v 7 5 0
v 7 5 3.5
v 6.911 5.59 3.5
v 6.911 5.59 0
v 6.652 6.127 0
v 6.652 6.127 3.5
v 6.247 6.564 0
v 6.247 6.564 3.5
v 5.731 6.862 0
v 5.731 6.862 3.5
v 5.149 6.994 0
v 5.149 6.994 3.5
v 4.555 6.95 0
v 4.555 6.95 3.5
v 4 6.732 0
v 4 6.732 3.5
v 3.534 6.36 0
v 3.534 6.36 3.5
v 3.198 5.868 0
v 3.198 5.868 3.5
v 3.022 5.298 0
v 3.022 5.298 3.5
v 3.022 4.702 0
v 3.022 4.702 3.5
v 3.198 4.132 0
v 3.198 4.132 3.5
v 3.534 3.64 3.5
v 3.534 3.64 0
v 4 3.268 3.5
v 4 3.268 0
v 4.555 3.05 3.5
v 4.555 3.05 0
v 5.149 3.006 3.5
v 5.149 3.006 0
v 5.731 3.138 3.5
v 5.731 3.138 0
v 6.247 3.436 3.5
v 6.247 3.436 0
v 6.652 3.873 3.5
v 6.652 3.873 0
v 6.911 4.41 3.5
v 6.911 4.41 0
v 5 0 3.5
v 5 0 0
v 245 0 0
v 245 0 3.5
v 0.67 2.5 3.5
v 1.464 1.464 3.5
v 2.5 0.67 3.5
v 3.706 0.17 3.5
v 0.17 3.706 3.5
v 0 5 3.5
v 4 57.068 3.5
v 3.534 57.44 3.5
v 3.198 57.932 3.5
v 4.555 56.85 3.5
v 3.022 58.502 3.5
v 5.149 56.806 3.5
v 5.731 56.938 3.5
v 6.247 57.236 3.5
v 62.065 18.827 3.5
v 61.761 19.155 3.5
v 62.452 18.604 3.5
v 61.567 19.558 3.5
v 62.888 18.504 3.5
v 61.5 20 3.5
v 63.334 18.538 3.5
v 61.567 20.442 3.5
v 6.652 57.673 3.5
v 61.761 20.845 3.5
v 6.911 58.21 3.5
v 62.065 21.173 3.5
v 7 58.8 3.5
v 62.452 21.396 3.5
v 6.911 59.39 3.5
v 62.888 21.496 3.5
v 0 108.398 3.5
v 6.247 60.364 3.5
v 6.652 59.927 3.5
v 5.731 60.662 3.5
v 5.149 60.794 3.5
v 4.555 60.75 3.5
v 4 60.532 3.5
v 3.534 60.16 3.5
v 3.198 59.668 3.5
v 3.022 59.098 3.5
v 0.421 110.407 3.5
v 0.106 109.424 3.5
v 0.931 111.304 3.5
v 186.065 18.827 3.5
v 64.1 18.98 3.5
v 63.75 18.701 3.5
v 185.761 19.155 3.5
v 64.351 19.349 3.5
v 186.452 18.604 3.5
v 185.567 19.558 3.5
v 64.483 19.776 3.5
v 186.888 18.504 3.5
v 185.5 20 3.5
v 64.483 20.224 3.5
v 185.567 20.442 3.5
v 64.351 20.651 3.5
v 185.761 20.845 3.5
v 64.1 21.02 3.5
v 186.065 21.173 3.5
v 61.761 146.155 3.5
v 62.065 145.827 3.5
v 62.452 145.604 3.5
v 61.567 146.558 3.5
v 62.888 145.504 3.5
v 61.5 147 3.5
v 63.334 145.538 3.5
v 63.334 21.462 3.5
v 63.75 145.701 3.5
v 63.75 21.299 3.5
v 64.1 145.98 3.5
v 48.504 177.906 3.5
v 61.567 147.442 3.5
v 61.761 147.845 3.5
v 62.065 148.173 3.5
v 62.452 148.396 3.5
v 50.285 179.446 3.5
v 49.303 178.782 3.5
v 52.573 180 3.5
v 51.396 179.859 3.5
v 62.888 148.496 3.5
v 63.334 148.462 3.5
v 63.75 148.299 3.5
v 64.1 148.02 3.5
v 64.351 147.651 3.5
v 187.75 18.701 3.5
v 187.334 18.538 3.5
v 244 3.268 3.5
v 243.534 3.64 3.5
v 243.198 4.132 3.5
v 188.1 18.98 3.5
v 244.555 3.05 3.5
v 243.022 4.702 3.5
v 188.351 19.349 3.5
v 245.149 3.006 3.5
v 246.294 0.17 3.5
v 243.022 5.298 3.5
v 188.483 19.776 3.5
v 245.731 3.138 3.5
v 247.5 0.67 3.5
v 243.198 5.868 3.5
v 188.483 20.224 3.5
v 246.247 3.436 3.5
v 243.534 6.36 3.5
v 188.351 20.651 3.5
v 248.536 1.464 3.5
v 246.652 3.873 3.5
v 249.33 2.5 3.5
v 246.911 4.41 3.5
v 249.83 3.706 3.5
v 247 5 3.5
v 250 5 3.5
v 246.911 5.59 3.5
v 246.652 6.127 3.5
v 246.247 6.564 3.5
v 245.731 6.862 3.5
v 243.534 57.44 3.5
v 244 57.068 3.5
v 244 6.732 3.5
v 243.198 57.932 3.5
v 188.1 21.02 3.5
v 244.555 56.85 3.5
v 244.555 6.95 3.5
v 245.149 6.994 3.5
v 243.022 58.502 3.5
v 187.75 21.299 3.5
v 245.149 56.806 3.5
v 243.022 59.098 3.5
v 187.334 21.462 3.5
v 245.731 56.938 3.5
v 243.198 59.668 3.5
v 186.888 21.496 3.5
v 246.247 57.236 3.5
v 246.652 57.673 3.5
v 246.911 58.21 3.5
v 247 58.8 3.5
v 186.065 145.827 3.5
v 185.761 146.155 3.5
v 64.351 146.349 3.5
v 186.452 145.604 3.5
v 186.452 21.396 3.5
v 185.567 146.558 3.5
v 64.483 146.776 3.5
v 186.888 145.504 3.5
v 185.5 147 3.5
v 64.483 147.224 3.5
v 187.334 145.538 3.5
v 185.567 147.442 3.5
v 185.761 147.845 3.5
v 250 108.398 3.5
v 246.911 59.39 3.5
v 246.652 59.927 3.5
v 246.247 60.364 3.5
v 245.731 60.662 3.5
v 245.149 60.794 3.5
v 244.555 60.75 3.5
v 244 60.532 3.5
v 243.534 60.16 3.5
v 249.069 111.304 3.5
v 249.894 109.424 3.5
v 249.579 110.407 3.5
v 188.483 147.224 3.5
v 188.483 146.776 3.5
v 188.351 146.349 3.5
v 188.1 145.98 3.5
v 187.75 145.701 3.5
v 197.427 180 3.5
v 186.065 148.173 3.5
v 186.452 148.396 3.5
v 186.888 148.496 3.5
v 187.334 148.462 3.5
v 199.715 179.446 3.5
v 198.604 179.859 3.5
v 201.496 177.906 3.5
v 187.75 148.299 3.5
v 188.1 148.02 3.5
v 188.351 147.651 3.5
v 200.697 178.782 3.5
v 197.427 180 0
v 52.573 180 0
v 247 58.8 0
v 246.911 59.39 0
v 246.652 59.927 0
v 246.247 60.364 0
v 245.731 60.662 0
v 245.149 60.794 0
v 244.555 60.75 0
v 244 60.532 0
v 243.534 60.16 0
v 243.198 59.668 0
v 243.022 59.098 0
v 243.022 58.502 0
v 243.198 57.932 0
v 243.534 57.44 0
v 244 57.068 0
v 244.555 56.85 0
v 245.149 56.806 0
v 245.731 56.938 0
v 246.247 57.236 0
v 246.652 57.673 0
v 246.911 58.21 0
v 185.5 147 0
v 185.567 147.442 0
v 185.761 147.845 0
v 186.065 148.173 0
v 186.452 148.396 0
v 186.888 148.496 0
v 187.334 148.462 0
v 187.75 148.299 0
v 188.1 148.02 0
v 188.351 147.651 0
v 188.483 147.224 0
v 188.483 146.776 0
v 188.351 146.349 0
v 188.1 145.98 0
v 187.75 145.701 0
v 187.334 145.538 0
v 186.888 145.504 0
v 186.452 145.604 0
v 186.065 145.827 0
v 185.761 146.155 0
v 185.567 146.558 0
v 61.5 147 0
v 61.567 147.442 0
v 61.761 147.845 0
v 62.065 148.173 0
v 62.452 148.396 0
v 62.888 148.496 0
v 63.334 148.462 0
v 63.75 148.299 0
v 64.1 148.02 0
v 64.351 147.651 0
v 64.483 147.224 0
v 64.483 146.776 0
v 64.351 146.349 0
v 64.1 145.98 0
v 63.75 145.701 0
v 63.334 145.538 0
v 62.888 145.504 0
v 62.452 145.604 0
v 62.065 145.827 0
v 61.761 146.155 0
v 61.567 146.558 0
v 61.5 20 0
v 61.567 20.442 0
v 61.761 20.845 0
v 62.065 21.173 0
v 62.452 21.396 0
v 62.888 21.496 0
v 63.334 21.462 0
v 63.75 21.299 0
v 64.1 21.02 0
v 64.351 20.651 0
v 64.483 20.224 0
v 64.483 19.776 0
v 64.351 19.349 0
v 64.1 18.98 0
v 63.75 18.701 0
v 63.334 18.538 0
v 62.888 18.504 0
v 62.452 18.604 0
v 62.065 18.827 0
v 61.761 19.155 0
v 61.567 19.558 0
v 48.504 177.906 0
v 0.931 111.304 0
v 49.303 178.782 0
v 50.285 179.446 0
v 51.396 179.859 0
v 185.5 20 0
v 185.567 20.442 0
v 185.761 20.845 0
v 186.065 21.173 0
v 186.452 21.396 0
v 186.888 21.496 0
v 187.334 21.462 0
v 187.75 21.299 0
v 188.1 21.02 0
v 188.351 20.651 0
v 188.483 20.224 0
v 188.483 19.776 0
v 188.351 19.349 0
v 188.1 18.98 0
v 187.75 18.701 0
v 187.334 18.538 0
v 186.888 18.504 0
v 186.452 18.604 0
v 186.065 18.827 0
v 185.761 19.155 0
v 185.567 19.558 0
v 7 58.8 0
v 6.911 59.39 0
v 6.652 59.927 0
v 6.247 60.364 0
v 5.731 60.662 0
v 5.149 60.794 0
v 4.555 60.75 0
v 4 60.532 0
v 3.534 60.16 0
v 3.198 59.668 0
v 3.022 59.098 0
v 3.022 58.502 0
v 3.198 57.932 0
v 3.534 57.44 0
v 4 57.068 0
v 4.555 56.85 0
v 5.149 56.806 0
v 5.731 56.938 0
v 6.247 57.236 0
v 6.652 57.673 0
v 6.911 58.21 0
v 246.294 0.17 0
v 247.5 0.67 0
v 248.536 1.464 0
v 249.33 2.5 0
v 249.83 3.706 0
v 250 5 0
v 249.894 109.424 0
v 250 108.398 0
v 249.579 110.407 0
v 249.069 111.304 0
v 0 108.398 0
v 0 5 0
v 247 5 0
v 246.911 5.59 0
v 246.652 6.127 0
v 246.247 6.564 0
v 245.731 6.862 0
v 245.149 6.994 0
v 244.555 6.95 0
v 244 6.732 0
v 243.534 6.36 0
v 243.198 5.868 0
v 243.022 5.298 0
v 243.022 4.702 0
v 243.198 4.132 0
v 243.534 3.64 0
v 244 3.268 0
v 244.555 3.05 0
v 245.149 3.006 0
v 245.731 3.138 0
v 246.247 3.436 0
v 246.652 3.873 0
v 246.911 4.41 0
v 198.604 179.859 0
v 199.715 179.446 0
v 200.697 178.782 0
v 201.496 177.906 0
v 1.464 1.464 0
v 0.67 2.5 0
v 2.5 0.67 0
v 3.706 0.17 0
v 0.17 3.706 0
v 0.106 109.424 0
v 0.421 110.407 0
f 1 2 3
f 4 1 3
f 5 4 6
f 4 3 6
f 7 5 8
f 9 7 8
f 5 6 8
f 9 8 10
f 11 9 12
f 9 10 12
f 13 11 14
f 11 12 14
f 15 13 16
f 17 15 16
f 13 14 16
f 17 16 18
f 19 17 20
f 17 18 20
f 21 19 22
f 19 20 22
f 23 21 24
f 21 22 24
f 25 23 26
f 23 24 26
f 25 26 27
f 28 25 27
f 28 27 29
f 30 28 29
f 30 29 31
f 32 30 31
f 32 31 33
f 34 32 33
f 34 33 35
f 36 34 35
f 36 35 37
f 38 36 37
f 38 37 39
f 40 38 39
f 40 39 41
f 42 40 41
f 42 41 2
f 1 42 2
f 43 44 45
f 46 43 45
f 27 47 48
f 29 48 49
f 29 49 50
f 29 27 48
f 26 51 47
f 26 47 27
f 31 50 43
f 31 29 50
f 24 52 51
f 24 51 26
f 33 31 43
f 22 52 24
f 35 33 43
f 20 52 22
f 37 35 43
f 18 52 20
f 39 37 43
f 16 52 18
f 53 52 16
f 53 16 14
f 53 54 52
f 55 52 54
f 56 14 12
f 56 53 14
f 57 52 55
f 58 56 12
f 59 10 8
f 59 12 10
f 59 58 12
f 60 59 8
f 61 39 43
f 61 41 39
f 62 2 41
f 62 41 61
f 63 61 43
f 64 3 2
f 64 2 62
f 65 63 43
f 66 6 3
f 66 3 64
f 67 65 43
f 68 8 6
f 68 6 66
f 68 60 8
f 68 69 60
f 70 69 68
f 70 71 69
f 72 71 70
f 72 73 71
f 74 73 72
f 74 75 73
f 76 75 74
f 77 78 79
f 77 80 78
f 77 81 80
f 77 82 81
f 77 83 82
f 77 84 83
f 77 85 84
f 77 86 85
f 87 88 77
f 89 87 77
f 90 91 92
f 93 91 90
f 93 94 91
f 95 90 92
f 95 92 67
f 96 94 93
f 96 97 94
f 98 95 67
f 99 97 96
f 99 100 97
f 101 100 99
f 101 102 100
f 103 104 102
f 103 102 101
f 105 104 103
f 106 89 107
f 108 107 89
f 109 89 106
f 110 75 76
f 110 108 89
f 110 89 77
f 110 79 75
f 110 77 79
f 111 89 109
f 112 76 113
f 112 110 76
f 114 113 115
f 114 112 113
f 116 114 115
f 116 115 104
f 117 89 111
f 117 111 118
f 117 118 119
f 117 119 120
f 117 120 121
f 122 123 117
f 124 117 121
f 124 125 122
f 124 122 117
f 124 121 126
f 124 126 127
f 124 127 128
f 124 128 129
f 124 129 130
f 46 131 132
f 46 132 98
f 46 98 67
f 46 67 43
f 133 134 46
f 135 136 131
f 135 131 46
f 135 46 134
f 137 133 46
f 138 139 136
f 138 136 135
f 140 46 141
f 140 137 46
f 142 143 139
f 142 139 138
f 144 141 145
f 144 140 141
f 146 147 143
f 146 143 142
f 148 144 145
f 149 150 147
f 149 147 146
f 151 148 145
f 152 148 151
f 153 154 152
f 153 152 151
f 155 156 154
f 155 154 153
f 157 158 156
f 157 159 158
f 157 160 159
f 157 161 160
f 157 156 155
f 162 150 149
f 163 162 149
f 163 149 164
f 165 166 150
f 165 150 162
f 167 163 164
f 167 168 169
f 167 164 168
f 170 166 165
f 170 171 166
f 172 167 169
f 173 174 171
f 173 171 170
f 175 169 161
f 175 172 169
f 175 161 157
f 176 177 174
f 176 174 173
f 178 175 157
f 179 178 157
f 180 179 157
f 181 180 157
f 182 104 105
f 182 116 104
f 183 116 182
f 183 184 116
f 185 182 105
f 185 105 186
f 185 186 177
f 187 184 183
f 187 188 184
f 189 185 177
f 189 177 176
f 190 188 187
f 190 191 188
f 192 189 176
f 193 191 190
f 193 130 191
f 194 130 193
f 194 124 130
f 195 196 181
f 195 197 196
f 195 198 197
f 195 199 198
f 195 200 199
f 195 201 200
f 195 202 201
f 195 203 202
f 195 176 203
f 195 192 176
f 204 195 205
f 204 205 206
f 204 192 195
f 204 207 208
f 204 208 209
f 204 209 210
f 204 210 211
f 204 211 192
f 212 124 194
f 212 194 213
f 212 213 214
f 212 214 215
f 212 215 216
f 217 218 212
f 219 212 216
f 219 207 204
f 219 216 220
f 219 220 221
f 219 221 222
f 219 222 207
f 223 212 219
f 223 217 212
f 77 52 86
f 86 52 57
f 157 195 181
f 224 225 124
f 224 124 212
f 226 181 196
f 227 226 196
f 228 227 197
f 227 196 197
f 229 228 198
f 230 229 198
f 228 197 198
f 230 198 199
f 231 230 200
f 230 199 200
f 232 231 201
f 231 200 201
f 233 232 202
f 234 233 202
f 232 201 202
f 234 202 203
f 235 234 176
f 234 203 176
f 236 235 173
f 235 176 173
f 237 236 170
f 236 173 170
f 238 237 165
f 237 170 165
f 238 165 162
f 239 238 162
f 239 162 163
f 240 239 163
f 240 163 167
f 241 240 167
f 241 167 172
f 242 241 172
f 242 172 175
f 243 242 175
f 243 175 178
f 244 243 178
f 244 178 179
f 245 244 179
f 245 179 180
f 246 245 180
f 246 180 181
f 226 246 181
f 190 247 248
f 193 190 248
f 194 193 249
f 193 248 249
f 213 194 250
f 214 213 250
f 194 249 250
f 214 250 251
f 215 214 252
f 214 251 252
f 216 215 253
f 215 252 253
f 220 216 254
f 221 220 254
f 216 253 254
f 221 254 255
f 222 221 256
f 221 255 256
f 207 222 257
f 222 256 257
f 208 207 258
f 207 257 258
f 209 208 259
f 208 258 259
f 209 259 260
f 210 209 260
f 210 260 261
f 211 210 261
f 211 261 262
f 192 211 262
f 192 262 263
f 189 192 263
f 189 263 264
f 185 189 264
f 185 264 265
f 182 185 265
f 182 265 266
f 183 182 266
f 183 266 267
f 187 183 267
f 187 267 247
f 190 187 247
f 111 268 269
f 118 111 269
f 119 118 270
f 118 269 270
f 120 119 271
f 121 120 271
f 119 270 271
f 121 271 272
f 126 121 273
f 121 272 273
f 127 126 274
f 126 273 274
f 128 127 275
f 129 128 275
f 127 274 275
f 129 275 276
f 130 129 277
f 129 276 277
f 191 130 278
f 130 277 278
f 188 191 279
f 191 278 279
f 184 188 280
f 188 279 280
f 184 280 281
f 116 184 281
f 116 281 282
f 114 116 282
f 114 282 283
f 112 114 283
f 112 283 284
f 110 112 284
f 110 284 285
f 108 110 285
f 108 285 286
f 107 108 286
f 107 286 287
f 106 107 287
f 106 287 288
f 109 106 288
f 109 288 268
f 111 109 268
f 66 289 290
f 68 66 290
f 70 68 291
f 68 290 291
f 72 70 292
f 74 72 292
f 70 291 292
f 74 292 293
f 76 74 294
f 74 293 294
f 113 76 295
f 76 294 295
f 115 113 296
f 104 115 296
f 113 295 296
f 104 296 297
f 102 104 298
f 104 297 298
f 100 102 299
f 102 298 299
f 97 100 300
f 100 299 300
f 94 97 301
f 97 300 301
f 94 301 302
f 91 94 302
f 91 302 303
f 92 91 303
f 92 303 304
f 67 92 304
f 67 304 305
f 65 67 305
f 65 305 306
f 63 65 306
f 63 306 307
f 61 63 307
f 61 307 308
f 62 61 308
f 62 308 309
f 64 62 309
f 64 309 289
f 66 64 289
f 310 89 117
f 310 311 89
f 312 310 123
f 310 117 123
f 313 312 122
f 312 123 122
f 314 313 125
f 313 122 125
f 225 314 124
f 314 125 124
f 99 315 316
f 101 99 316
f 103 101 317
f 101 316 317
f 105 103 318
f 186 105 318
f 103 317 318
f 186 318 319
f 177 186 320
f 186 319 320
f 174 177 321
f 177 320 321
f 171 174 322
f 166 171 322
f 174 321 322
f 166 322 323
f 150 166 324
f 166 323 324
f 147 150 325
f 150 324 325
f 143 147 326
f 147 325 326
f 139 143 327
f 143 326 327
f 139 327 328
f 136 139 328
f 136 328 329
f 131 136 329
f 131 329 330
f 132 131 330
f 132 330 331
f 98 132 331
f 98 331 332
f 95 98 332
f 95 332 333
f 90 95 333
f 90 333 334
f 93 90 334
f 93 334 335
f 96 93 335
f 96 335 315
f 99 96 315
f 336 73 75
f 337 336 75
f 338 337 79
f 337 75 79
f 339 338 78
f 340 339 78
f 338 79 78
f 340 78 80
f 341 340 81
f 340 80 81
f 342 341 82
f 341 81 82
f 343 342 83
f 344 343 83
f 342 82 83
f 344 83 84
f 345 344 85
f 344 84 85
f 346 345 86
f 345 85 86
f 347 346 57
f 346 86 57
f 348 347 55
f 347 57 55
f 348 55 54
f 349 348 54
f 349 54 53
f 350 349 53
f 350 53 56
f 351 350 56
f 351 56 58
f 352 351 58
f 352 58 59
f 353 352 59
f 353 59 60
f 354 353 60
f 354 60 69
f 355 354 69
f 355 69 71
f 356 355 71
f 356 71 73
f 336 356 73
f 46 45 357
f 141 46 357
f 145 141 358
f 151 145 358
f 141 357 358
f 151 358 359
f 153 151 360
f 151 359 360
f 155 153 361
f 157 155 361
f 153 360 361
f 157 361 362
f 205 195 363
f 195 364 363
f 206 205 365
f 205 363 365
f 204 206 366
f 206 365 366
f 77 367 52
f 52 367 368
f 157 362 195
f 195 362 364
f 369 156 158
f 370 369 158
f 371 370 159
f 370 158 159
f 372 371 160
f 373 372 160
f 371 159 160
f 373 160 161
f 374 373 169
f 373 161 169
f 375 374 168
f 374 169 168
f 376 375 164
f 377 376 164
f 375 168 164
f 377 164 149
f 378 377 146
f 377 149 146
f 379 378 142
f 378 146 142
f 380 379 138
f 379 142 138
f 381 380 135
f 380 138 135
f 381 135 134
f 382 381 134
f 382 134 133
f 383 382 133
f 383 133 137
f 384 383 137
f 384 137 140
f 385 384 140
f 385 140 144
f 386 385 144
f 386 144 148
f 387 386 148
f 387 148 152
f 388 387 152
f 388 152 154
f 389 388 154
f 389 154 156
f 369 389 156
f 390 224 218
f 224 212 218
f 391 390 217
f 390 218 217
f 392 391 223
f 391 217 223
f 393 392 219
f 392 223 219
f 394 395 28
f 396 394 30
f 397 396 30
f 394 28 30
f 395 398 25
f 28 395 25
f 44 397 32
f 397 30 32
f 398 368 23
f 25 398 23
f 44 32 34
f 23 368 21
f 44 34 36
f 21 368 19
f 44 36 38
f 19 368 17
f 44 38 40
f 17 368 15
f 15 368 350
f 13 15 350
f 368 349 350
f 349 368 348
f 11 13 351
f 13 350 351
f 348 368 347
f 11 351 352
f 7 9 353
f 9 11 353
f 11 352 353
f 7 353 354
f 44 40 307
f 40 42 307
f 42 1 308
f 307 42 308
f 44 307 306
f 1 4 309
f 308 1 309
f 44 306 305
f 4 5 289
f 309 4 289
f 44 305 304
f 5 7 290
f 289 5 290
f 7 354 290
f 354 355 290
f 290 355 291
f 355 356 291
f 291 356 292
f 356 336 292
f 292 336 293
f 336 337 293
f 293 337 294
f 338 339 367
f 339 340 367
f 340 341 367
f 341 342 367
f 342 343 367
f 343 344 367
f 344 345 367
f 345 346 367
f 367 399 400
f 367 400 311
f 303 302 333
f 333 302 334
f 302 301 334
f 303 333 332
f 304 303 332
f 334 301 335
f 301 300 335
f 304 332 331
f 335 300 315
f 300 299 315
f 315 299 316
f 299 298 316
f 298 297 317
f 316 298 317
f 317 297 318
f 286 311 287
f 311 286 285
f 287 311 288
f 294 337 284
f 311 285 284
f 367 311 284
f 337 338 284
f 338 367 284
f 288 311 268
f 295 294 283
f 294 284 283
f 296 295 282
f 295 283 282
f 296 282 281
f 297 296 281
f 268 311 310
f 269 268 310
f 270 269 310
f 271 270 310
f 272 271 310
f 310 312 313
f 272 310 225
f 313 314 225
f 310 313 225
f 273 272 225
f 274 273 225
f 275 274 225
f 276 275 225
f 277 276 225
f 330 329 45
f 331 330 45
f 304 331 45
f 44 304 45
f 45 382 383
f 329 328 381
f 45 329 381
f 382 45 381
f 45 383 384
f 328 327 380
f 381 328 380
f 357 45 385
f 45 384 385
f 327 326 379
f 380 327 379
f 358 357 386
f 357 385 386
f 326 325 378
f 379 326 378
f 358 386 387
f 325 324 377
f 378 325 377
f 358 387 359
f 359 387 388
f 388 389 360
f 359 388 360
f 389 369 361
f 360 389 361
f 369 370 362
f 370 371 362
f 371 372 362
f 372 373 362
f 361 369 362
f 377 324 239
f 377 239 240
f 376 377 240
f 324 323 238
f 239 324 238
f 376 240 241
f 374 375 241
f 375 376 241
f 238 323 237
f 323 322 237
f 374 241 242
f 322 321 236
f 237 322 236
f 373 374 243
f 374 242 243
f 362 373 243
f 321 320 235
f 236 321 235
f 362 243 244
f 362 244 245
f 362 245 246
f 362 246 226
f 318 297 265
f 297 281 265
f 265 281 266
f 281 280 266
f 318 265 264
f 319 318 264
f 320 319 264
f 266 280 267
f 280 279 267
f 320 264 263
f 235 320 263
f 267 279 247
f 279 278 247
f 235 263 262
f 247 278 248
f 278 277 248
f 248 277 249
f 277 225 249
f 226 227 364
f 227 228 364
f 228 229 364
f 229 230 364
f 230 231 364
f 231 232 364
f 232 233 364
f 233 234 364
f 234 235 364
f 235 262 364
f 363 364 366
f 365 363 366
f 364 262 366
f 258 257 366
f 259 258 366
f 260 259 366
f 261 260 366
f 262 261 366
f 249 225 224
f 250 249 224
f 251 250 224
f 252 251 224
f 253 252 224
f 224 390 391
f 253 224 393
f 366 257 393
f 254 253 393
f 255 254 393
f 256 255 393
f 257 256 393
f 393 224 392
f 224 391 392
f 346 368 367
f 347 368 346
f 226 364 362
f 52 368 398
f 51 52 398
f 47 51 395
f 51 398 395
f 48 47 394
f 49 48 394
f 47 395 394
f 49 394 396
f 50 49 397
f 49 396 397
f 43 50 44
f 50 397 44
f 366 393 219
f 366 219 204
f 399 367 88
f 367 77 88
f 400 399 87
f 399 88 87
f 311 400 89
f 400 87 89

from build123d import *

# Parameters (mm, degrees)
BOSS_EXTRU_1_DEPTH           = 3.5
ESQUISSE2_R                  = 2
ENL_V_MAT_EXTRU_1_DEPTH      = 395.382111663
ENL_V_MAT_EXTRU_2_DEPTH      = 395.382111663
ENL_V_MAT_EXTRU_2_DEPTH_BACK = 395.382111663
CONG_1_R                     = 5
ESQUISSE4_R                  = 1.5
ENL_V_MAT_EXTRU_3_DEPTH      = 309.078317965


with BuildPart() as part:
    # Esquisse1 → Boss.-Extru.1 (new body)
    with BuildSketch(Plane.XY):
        with BuildLine():
            Line((5, 0), (245, 0))
            ThreePointArc((245, 0), (248.535533906, 1.464466094), (250, 5))
            Line((250, 5), (250, 305))
            Line((250, 305), (0, 305))
            Line((0, 305), (0, 5))
            ThreePointArc((0, 5), (1.464466094, 1.464466094), (5, 0))
        make_face()
    extrude(amount=BOSS_EXTRU_1_DEPTH)

    # Esquisse2 → Enlèv. mat.-Extru.1 (cut, through all)
    with BuildSketch(Plane.XY.offset(3.5)):
        with Locations((5, 5)):
            Circle(ESQUISSE2_R)
        with Locations((245, 5)):
            Circle(ESQUISSE2_R)
        with Locations((5, 58.8)):
            Circle(ESQUISSE2_R)
        with Locations((245, 58.8)):
            Circle(ESQUISSE2_R)
    extrude(amount=-ENL_V_MAT_EXTRU_1_DEPTH, mode=Mode.SUBTRACT)

    # Esquisse3 → Enlèv. mat.-Extru.2 (cut, two sides: drawn at the far end of the back side and taken through both)
    with BuildSketch(Plane.XY.offset(3.5).offset(-ENL_V_MAT_EXTRU_2_DEPTH_BACK)):
        Polygon((-374.383398967, -414.136758554), (0, 110), (50, 180), (200, 180), (250, 110), (624.383398967, -414.136758554), (624.383398967, 874.090350445), (-374.383398967, 874.090350445), align=None)
    extrude(amount=ENL_V_MAT_EXTRU_2_DEPTH + ENL_V_MAT_EXTRU_2_DEPTH_BACK, mode=Mode.SUBTRACT)

    # Congé1
    cong_1_edges = [part.edges().sort_by_distance(p)[0] for p in [
        (50, 180, 1.75),
        (200, 180, 1.75),
        (250, 110, 1.75),
        (0, 110, 1.75),
    ]]
    fillet(cong_1_edges, radius=CONG_1_R)

    # Esquisse4 → Enlèv. mat.-Extru.3 (cut, through all)
    with BuildSketch(Plane(origin=(0, 0, 0), x_dir=(-1, 0, 0), z_dir=(0, 0, -1))):
        with Locations((-187, 20)):
            Circle(ESQUISSE4_R)
        with Locations((-187, 147)):
            Circle(ESQUISSE4_R)
        with Locations((-63, 147)):
            Circle(ESQUISSE4_R)
        with Locations((-63, 20)):
            Circle(ESQUISSE4_R)
    extrude(amount=-ENL_V_MAT_EXTRU_3_DEPTH, mode=Mode.SUBTRACT)


solid = part.part
